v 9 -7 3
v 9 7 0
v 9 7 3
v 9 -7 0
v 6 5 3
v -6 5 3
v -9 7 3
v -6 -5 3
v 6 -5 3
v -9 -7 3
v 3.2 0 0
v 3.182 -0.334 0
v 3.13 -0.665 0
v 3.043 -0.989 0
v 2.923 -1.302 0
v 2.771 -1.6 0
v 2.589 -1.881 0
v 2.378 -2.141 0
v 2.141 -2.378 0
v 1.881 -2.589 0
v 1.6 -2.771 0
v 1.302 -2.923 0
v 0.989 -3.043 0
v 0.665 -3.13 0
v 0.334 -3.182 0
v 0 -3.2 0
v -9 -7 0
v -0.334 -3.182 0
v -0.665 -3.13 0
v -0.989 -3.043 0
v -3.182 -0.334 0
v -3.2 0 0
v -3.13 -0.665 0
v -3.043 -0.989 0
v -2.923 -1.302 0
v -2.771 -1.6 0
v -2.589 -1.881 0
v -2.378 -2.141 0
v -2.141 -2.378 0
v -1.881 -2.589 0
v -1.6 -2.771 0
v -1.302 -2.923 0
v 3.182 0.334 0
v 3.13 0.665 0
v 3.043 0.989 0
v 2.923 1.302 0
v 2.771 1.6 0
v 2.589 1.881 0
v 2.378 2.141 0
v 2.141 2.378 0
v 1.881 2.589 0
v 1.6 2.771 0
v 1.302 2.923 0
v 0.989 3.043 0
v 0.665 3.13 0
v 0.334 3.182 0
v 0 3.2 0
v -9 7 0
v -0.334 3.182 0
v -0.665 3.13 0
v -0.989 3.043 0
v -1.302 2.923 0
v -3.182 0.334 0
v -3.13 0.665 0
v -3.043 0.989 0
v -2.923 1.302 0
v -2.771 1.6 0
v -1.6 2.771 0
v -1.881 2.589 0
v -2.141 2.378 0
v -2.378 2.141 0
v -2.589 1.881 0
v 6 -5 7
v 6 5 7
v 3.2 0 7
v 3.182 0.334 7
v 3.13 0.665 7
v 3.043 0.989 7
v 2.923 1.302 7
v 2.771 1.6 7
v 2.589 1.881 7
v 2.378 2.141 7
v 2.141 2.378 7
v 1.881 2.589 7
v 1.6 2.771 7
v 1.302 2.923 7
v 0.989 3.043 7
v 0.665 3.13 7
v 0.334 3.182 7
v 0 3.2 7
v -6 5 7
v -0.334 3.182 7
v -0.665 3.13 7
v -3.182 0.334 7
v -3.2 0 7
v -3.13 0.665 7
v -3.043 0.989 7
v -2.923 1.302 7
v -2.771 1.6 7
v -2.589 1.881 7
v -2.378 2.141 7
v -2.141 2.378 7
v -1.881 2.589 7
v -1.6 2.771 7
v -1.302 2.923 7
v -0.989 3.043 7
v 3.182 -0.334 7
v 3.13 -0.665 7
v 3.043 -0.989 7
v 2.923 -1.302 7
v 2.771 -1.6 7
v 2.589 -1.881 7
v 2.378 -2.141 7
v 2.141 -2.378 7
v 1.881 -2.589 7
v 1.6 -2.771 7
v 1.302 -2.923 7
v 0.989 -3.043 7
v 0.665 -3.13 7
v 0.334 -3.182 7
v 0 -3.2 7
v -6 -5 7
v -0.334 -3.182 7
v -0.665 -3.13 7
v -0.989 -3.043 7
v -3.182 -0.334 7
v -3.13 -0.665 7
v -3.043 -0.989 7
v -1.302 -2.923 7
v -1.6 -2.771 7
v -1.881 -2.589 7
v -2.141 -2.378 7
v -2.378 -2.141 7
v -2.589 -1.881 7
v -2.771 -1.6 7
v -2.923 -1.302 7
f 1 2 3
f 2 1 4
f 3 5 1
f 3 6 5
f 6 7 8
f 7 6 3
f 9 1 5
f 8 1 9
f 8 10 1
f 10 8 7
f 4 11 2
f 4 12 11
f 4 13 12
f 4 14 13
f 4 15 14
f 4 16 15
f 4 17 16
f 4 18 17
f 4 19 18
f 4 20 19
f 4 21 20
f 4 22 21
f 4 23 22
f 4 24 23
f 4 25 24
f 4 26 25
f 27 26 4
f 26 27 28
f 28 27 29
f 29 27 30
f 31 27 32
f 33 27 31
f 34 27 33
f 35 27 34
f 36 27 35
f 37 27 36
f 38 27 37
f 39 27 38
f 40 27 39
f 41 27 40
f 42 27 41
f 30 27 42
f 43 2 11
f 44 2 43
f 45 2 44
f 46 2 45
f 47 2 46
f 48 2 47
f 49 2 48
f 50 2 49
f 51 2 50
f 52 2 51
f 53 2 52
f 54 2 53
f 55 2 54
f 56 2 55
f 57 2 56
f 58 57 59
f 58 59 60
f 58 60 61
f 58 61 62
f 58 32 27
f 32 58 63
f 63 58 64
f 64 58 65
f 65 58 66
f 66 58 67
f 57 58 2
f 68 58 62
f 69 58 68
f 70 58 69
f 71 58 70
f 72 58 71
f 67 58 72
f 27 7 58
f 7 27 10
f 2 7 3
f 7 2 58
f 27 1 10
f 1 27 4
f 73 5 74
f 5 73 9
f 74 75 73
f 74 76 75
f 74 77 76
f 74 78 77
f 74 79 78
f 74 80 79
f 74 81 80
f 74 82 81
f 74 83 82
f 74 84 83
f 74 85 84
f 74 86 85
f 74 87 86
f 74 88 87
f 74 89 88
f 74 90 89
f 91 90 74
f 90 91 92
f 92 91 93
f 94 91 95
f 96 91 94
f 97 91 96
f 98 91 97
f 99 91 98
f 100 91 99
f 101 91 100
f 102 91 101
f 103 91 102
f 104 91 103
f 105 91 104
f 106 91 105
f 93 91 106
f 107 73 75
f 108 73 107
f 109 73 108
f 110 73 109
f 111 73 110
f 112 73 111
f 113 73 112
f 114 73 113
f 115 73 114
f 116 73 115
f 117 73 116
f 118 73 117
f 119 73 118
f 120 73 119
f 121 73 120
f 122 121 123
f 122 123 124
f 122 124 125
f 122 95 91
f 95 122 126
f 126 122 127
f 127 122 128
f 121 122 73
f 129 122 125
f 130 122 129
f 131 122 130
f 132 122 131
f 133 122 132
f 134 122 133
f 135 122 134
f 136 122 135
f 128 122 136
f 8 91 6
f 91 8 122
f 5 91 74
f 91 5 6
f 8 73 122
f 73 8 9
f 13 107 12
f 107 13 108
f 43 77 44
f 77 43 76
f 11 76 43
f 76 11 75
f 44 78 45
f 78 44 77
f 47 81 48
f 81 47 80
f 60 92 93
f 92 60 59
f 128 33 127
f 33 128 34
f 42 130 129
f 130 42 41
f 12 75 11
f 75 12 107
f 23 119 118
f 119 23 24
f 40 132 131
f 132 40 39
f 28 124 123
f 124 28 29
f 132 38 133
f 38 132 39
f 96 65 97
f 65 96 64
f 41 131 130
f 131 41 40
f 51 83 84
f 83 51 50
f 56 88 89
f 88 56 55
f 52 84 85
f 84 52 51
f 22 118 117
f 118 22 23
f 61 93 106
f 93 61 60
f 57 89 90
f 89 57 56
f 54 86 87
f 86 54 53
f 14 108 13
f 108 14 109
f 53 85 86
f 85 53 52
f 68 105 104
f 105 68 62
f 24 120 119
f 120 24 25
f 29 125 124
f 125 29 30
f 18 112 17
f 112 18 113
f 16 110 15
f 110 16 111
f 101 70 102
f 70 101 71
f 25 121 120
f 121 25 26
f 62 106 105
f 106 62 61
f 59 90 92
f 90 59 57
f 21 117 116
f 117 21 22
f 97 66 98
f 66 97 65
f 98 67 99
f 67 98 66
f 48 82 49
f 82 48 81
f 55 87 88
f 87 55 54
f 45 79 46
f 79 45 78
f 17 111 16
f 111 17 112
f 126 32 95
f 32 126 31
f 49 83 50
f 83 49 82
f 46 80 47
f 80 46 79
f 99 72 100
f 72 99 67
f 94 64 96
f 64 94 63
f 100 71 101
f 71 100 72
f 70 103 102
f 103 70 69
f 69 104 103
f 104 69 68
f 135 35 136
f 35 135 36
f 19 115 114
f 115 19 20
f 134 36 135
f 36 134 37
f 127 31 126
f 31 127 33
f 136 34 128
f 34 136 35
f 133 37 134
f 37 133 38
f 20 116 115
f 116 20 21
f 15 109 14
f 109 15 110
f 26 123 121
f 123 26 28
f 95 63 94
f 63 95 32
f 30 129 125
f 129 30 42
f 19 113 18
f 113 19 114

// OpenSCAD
// T-slot nut for aluminium extrusion.
$fn = 60;
eps = 0.02;
slot_w = 10;
thread_d = 6.4;
length = 18;
body_w = slot_w + 4;
body_h = 7;
difference() {
    union() {
        translate([-length / 2, -body_w / 2, 0]) cube([length, body_w, 3]);
        translate([-length / 2 + 3, -slot_w / 2, 3]) cube([length - 6, slot_w, body_h - 3]);
    }
    translate([0, 0, -eps]) cylinder(d = thread_d, h = body_h + 2 * eps);
}
